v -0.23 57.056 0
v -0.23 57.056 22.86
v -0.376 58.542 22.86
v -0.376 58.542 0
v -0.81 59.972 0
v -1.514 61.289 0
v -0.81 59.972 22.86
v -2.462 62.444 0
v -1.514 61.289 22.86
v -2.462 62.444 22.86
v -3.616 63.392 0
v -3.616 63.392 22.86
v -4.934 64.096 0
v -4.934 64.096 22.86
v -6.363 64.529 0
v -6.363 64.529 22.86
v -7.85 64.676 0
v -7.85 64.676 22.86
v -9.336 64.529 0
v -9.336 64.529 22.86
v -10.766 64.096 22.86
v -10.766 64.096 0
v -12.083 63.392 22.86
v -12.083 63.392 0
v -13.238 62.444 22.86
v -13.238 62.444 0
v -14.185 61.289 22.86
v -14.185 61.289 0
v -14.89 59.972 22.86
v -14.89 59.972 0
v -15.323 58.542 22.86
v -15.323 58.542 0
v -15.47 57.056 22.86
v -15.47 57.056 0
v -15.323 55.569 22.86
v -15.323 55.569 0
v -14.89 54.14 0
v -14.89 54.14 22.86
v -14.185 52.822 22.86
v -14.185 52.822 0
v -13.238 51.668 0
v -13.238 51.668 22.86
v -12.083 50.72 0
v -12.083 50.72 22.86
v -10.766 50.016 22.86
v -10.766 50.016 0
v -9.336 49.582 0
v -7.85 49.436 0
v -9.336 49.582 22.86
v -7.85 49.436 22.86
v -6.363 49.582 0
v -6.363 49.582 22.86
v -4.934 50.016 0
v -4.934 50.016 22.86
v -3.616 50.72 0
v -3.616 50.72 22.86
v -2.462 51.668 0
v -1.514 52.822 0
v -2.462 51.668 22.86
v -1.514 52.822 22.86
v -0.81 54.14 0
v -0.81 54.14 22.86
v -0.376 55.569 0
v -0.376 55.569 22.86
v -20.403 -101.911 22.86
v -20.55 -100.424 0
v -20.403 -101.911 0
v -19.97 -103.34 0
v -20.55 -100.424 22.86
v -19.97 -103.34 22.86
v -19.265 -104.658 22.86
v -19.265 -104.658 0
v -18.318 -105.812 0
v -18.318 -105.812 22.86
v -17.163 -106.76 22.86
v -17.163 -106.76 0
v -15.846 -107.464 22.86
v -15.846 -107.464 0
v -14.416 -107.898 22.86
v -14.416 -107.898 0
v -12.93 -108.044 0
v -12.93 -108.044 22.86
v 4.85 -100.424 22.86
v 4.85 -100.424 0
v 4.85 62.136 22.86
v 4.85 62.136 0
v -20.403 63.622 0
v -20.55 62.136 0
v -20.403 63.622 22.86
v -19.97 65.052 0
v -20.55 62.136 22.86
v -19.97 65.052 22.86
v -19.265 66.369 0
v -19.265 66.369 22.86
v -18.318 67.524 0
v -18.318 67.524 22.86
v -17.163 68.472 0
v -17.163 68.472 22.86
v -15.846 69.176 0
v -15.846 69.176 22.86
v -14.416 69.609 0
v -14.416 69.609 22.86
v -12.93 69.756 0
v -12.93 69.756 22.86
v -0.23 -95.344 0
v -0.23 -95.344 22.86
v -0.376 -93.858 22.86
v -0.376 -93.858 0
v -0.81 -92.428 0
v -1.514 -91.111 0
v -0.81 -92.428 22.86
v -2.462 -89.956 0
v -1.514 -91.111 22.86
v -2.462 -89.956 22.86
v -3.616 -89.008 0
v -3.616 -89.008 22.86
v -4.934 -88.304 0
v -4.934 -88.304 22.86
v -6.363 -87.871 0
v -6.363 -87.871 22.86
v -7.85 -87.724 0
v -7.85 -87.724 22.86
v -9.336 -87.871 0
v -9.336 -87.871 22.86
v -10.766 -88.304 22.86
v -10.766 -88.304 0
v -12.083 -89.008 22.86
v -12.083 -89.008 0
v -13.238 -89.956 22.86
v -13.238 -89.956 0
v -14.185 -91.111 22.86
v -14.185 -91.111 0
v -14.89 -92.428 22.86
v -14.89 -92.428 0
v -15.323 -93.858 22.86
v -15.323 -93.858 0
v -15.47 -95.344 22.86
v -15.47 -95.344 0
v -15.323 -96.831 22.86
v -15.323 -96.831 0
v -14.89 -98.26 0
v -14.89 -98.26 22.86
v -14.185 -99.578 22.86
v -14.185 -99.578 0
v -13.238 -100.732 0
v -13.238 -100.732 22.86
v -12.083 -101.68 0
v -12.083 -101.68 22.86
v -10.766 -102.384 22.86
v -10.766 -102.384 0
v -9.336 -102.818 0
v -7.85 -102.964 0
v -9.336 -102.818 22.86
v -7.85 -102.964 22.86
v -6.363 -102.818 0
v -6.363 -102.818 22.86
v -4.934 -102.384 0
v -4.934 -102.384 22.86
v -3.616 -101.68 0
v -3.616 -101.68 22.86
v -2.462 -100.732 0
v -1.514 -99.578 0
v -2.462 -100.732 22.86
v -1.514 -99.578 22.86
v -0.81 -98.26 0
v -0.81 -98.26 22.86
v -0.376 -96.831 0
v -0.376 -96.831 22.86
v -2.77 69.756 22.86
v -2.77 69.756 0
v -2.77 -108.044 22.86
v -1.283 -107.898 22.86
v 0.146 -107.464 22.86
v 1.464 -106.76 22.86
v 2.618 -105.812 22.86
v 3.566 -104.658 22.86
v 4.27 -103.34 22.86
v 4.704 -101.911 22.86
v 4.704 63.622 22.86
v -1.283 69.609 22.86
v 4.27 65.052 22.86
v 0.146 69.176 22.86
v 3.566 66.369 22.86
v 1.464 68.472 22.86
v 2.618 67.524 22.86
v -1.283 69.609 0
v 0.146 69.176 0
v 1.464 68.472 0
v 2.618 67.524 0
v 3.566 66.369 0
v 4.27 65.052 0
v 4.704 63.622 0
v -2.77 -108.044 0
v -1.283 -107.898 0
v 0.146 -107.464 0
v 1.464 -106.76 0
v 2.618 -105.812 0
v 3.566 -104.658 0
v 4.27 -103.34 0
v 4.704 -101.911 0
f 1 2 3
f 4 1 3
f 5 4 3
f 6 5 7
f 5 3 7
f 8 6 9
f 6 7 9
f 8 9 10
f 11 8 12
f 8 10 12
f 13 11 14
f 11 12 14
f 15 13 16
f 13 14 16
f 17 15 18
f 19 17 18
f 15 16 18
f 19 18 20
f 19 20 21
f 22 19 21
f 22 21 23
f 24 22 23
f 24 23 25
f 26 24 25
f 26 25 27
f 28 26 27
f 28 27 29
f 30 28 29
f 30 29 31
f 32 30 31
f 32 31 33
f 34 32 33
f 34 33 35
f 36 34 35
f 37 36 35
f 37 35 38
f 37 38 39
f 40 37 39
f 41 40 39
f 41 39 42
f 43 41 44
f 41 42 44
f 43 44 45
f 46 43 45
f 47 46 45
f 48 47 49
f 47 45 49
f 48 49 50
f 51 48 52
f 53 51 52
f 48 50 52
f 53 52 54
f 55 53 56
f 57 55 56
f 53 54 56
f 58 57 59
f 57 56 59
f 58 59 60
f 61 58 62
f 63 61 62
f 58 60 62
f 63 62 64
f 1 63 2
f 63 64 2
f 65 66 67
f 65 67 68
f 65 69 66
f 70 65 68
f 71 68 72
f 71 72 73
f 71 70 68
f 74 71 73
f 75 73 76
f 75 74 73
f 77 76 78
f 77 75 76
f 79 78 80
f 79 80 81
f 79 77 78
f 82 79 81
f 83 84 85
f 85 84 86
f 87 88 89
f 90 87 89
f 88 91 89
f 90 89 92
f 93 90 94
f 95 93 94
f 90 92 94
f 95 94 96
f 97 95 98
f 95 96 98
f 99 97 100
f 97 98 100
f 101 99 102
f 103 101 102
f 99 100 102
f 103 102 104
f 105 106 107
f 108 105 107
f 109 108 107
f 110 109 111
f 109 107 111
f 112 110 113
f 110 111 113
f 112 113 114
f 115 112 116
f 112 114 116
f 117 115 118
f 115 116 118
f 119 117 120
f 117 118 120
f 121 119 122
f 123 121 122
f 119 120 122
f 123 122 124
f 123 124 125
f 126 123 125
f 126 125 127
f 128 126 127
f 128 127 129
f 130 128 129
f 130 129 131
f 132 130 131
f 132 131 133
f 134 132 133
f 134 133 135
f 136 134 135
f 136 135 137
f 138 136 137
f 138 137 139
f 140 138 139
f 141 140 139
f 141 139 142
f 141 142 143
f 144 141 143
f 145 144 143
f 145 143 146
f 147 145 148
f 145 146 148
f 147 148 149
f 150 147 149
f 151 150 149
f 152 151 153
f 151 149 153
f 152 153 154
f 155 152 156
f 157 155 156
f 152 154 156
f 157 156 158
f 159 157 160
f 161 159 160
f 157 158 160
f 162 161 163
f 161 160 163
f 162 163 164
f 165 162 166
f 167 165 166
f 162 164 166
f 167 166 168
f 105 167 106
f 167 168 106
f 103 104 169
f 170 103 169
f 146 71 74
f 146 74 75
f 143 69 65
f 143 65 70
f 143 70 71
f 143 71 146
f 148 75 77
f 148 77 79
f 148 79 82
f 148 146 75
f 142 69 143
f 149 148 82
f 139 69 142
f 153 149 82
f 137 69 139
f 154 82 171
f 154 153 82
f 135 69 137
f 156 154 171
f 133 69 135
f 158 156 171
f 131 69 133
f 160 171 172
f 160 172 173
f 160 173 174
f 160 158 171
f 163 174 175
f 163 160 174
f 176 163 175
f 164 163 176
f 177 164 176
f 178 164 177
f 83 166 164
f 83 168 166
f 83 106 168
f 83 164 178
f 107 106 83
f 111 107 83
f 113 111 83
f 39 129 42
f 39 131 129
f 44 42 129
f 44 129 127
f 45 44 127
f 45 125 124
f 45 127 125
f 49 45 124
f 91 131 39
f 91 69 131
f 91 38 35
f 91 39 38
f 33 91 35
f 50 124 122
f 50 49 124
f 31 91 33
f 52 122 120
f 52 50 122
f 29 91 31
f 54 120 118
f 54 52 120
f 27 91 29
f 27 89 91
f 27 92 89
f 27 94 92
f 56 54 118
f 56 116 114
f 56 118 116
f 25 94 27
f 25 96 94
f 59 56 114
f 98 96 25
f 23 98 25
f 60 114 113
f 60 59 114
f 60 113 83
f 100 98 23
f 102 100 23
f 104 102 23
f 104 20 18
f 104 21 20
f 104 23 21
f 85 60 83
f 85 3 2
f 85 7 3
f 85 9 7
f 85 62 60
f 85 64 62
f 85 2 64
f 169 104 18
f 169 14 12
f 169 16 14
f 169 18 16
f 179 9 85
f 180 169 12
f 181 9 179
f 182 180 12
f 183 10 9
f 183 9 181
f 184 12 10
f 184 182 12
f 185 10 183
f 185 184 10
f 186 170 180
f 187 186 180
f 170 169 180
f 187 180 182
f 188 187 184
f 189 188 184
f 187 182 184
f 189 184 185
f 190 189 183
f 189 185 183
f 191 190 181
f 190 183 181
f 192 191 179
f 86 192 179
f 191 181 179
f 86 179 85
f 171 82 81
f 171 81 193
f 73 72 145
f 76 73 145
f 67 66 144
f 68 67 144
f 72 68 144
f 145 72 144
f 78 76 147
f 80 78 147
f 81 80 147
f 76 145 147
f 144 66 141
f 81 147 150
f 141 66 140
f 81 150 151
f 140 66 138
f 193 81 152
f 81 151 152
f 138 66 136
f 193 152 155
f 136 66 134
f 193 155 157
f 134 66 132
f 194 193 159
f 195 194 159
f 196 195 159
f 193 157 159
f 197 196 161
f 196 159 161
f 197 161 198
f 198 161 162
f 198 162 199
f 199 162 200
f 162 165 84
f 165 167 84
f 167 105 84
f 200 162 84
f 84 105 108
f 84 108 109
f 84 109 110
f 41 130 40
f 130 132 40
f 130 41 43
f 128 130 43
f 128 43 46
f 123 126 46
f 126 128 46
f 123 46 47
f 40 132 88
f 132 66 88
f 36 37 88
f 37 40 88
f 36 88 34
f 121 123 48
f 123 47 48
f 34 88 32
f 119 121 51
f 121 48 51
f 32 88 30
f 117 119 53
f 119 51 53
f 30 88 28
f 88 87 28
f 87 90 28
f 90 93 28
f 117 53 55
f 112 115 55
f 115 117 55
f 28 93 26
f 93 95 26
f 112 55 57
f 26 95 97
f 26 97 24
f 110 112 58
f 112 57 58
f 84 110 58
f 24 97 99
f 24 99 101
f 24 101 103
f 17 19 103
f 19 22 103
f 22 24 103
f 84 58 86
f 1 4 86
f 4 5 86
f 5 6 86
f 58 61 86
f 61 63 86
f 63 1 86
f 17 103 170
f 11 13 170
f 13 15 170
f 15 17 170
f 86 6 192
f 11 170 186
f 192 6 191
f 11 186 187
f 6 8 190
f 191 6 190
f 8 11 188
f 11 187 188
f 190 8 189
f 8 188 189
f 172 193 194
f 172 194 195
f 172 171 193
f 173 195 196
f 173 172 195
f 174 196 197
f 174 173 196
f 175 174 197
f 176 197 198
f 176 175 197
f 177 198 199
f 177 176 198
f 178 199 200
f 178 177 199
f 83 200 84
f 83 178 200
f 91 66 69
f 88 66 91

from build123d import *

# Parameters (mm, degrees)
SKETCH1_W          = 25.4
SKETCH1_H          = 177.8
BASE_EXTRUDE_DEPTH = 22.86
SKETCH2_R          = 7.62
CUT_EXTRUDE1_DEPTH = 78.74
FILLET1_R          = 7.62


with BuildPart() as part:
    # Sketch1 → Base-Extrude (new body)
    with BuildSketch(Plane.XY):
        with Locations((-7.849662618, -19.144264507)):
            Rectangle(SKETCH1_W, SKETCH1_H)
    extrude(amount=BASE_EXTRUDE_DEPTH)

    # Sketch2 → Cut-Extrude1 (cut)
    with BuildSketch(Plane.XY.offset(22.86)):
        with Locations((-7.849662618, -95.344264507)):
            Circle(SKETCH2_R)
        with Locations((-7.849662618, 57.055735493)):
            Circle(SKETCH2_R)
    extrude(amount=-CUT_EXTRUDE1_DEPTH, mode=Mode.SUBTRACT)

    # Fillet1
    fillet1_edges = [part.edges().sort_by_distance(p)[0] for p in [
        (-20.549662618, 69.755735493, 11.43),
        (4.850337382, 69.755735493, 11.43),
        (4.850337382, -108.044264507, 11.43),
        (-20.549662618, -108.044264507, 11.43),
    ]]
    fillet(fillet1_edges, radius=FILLET1_R)


solid = part.part
